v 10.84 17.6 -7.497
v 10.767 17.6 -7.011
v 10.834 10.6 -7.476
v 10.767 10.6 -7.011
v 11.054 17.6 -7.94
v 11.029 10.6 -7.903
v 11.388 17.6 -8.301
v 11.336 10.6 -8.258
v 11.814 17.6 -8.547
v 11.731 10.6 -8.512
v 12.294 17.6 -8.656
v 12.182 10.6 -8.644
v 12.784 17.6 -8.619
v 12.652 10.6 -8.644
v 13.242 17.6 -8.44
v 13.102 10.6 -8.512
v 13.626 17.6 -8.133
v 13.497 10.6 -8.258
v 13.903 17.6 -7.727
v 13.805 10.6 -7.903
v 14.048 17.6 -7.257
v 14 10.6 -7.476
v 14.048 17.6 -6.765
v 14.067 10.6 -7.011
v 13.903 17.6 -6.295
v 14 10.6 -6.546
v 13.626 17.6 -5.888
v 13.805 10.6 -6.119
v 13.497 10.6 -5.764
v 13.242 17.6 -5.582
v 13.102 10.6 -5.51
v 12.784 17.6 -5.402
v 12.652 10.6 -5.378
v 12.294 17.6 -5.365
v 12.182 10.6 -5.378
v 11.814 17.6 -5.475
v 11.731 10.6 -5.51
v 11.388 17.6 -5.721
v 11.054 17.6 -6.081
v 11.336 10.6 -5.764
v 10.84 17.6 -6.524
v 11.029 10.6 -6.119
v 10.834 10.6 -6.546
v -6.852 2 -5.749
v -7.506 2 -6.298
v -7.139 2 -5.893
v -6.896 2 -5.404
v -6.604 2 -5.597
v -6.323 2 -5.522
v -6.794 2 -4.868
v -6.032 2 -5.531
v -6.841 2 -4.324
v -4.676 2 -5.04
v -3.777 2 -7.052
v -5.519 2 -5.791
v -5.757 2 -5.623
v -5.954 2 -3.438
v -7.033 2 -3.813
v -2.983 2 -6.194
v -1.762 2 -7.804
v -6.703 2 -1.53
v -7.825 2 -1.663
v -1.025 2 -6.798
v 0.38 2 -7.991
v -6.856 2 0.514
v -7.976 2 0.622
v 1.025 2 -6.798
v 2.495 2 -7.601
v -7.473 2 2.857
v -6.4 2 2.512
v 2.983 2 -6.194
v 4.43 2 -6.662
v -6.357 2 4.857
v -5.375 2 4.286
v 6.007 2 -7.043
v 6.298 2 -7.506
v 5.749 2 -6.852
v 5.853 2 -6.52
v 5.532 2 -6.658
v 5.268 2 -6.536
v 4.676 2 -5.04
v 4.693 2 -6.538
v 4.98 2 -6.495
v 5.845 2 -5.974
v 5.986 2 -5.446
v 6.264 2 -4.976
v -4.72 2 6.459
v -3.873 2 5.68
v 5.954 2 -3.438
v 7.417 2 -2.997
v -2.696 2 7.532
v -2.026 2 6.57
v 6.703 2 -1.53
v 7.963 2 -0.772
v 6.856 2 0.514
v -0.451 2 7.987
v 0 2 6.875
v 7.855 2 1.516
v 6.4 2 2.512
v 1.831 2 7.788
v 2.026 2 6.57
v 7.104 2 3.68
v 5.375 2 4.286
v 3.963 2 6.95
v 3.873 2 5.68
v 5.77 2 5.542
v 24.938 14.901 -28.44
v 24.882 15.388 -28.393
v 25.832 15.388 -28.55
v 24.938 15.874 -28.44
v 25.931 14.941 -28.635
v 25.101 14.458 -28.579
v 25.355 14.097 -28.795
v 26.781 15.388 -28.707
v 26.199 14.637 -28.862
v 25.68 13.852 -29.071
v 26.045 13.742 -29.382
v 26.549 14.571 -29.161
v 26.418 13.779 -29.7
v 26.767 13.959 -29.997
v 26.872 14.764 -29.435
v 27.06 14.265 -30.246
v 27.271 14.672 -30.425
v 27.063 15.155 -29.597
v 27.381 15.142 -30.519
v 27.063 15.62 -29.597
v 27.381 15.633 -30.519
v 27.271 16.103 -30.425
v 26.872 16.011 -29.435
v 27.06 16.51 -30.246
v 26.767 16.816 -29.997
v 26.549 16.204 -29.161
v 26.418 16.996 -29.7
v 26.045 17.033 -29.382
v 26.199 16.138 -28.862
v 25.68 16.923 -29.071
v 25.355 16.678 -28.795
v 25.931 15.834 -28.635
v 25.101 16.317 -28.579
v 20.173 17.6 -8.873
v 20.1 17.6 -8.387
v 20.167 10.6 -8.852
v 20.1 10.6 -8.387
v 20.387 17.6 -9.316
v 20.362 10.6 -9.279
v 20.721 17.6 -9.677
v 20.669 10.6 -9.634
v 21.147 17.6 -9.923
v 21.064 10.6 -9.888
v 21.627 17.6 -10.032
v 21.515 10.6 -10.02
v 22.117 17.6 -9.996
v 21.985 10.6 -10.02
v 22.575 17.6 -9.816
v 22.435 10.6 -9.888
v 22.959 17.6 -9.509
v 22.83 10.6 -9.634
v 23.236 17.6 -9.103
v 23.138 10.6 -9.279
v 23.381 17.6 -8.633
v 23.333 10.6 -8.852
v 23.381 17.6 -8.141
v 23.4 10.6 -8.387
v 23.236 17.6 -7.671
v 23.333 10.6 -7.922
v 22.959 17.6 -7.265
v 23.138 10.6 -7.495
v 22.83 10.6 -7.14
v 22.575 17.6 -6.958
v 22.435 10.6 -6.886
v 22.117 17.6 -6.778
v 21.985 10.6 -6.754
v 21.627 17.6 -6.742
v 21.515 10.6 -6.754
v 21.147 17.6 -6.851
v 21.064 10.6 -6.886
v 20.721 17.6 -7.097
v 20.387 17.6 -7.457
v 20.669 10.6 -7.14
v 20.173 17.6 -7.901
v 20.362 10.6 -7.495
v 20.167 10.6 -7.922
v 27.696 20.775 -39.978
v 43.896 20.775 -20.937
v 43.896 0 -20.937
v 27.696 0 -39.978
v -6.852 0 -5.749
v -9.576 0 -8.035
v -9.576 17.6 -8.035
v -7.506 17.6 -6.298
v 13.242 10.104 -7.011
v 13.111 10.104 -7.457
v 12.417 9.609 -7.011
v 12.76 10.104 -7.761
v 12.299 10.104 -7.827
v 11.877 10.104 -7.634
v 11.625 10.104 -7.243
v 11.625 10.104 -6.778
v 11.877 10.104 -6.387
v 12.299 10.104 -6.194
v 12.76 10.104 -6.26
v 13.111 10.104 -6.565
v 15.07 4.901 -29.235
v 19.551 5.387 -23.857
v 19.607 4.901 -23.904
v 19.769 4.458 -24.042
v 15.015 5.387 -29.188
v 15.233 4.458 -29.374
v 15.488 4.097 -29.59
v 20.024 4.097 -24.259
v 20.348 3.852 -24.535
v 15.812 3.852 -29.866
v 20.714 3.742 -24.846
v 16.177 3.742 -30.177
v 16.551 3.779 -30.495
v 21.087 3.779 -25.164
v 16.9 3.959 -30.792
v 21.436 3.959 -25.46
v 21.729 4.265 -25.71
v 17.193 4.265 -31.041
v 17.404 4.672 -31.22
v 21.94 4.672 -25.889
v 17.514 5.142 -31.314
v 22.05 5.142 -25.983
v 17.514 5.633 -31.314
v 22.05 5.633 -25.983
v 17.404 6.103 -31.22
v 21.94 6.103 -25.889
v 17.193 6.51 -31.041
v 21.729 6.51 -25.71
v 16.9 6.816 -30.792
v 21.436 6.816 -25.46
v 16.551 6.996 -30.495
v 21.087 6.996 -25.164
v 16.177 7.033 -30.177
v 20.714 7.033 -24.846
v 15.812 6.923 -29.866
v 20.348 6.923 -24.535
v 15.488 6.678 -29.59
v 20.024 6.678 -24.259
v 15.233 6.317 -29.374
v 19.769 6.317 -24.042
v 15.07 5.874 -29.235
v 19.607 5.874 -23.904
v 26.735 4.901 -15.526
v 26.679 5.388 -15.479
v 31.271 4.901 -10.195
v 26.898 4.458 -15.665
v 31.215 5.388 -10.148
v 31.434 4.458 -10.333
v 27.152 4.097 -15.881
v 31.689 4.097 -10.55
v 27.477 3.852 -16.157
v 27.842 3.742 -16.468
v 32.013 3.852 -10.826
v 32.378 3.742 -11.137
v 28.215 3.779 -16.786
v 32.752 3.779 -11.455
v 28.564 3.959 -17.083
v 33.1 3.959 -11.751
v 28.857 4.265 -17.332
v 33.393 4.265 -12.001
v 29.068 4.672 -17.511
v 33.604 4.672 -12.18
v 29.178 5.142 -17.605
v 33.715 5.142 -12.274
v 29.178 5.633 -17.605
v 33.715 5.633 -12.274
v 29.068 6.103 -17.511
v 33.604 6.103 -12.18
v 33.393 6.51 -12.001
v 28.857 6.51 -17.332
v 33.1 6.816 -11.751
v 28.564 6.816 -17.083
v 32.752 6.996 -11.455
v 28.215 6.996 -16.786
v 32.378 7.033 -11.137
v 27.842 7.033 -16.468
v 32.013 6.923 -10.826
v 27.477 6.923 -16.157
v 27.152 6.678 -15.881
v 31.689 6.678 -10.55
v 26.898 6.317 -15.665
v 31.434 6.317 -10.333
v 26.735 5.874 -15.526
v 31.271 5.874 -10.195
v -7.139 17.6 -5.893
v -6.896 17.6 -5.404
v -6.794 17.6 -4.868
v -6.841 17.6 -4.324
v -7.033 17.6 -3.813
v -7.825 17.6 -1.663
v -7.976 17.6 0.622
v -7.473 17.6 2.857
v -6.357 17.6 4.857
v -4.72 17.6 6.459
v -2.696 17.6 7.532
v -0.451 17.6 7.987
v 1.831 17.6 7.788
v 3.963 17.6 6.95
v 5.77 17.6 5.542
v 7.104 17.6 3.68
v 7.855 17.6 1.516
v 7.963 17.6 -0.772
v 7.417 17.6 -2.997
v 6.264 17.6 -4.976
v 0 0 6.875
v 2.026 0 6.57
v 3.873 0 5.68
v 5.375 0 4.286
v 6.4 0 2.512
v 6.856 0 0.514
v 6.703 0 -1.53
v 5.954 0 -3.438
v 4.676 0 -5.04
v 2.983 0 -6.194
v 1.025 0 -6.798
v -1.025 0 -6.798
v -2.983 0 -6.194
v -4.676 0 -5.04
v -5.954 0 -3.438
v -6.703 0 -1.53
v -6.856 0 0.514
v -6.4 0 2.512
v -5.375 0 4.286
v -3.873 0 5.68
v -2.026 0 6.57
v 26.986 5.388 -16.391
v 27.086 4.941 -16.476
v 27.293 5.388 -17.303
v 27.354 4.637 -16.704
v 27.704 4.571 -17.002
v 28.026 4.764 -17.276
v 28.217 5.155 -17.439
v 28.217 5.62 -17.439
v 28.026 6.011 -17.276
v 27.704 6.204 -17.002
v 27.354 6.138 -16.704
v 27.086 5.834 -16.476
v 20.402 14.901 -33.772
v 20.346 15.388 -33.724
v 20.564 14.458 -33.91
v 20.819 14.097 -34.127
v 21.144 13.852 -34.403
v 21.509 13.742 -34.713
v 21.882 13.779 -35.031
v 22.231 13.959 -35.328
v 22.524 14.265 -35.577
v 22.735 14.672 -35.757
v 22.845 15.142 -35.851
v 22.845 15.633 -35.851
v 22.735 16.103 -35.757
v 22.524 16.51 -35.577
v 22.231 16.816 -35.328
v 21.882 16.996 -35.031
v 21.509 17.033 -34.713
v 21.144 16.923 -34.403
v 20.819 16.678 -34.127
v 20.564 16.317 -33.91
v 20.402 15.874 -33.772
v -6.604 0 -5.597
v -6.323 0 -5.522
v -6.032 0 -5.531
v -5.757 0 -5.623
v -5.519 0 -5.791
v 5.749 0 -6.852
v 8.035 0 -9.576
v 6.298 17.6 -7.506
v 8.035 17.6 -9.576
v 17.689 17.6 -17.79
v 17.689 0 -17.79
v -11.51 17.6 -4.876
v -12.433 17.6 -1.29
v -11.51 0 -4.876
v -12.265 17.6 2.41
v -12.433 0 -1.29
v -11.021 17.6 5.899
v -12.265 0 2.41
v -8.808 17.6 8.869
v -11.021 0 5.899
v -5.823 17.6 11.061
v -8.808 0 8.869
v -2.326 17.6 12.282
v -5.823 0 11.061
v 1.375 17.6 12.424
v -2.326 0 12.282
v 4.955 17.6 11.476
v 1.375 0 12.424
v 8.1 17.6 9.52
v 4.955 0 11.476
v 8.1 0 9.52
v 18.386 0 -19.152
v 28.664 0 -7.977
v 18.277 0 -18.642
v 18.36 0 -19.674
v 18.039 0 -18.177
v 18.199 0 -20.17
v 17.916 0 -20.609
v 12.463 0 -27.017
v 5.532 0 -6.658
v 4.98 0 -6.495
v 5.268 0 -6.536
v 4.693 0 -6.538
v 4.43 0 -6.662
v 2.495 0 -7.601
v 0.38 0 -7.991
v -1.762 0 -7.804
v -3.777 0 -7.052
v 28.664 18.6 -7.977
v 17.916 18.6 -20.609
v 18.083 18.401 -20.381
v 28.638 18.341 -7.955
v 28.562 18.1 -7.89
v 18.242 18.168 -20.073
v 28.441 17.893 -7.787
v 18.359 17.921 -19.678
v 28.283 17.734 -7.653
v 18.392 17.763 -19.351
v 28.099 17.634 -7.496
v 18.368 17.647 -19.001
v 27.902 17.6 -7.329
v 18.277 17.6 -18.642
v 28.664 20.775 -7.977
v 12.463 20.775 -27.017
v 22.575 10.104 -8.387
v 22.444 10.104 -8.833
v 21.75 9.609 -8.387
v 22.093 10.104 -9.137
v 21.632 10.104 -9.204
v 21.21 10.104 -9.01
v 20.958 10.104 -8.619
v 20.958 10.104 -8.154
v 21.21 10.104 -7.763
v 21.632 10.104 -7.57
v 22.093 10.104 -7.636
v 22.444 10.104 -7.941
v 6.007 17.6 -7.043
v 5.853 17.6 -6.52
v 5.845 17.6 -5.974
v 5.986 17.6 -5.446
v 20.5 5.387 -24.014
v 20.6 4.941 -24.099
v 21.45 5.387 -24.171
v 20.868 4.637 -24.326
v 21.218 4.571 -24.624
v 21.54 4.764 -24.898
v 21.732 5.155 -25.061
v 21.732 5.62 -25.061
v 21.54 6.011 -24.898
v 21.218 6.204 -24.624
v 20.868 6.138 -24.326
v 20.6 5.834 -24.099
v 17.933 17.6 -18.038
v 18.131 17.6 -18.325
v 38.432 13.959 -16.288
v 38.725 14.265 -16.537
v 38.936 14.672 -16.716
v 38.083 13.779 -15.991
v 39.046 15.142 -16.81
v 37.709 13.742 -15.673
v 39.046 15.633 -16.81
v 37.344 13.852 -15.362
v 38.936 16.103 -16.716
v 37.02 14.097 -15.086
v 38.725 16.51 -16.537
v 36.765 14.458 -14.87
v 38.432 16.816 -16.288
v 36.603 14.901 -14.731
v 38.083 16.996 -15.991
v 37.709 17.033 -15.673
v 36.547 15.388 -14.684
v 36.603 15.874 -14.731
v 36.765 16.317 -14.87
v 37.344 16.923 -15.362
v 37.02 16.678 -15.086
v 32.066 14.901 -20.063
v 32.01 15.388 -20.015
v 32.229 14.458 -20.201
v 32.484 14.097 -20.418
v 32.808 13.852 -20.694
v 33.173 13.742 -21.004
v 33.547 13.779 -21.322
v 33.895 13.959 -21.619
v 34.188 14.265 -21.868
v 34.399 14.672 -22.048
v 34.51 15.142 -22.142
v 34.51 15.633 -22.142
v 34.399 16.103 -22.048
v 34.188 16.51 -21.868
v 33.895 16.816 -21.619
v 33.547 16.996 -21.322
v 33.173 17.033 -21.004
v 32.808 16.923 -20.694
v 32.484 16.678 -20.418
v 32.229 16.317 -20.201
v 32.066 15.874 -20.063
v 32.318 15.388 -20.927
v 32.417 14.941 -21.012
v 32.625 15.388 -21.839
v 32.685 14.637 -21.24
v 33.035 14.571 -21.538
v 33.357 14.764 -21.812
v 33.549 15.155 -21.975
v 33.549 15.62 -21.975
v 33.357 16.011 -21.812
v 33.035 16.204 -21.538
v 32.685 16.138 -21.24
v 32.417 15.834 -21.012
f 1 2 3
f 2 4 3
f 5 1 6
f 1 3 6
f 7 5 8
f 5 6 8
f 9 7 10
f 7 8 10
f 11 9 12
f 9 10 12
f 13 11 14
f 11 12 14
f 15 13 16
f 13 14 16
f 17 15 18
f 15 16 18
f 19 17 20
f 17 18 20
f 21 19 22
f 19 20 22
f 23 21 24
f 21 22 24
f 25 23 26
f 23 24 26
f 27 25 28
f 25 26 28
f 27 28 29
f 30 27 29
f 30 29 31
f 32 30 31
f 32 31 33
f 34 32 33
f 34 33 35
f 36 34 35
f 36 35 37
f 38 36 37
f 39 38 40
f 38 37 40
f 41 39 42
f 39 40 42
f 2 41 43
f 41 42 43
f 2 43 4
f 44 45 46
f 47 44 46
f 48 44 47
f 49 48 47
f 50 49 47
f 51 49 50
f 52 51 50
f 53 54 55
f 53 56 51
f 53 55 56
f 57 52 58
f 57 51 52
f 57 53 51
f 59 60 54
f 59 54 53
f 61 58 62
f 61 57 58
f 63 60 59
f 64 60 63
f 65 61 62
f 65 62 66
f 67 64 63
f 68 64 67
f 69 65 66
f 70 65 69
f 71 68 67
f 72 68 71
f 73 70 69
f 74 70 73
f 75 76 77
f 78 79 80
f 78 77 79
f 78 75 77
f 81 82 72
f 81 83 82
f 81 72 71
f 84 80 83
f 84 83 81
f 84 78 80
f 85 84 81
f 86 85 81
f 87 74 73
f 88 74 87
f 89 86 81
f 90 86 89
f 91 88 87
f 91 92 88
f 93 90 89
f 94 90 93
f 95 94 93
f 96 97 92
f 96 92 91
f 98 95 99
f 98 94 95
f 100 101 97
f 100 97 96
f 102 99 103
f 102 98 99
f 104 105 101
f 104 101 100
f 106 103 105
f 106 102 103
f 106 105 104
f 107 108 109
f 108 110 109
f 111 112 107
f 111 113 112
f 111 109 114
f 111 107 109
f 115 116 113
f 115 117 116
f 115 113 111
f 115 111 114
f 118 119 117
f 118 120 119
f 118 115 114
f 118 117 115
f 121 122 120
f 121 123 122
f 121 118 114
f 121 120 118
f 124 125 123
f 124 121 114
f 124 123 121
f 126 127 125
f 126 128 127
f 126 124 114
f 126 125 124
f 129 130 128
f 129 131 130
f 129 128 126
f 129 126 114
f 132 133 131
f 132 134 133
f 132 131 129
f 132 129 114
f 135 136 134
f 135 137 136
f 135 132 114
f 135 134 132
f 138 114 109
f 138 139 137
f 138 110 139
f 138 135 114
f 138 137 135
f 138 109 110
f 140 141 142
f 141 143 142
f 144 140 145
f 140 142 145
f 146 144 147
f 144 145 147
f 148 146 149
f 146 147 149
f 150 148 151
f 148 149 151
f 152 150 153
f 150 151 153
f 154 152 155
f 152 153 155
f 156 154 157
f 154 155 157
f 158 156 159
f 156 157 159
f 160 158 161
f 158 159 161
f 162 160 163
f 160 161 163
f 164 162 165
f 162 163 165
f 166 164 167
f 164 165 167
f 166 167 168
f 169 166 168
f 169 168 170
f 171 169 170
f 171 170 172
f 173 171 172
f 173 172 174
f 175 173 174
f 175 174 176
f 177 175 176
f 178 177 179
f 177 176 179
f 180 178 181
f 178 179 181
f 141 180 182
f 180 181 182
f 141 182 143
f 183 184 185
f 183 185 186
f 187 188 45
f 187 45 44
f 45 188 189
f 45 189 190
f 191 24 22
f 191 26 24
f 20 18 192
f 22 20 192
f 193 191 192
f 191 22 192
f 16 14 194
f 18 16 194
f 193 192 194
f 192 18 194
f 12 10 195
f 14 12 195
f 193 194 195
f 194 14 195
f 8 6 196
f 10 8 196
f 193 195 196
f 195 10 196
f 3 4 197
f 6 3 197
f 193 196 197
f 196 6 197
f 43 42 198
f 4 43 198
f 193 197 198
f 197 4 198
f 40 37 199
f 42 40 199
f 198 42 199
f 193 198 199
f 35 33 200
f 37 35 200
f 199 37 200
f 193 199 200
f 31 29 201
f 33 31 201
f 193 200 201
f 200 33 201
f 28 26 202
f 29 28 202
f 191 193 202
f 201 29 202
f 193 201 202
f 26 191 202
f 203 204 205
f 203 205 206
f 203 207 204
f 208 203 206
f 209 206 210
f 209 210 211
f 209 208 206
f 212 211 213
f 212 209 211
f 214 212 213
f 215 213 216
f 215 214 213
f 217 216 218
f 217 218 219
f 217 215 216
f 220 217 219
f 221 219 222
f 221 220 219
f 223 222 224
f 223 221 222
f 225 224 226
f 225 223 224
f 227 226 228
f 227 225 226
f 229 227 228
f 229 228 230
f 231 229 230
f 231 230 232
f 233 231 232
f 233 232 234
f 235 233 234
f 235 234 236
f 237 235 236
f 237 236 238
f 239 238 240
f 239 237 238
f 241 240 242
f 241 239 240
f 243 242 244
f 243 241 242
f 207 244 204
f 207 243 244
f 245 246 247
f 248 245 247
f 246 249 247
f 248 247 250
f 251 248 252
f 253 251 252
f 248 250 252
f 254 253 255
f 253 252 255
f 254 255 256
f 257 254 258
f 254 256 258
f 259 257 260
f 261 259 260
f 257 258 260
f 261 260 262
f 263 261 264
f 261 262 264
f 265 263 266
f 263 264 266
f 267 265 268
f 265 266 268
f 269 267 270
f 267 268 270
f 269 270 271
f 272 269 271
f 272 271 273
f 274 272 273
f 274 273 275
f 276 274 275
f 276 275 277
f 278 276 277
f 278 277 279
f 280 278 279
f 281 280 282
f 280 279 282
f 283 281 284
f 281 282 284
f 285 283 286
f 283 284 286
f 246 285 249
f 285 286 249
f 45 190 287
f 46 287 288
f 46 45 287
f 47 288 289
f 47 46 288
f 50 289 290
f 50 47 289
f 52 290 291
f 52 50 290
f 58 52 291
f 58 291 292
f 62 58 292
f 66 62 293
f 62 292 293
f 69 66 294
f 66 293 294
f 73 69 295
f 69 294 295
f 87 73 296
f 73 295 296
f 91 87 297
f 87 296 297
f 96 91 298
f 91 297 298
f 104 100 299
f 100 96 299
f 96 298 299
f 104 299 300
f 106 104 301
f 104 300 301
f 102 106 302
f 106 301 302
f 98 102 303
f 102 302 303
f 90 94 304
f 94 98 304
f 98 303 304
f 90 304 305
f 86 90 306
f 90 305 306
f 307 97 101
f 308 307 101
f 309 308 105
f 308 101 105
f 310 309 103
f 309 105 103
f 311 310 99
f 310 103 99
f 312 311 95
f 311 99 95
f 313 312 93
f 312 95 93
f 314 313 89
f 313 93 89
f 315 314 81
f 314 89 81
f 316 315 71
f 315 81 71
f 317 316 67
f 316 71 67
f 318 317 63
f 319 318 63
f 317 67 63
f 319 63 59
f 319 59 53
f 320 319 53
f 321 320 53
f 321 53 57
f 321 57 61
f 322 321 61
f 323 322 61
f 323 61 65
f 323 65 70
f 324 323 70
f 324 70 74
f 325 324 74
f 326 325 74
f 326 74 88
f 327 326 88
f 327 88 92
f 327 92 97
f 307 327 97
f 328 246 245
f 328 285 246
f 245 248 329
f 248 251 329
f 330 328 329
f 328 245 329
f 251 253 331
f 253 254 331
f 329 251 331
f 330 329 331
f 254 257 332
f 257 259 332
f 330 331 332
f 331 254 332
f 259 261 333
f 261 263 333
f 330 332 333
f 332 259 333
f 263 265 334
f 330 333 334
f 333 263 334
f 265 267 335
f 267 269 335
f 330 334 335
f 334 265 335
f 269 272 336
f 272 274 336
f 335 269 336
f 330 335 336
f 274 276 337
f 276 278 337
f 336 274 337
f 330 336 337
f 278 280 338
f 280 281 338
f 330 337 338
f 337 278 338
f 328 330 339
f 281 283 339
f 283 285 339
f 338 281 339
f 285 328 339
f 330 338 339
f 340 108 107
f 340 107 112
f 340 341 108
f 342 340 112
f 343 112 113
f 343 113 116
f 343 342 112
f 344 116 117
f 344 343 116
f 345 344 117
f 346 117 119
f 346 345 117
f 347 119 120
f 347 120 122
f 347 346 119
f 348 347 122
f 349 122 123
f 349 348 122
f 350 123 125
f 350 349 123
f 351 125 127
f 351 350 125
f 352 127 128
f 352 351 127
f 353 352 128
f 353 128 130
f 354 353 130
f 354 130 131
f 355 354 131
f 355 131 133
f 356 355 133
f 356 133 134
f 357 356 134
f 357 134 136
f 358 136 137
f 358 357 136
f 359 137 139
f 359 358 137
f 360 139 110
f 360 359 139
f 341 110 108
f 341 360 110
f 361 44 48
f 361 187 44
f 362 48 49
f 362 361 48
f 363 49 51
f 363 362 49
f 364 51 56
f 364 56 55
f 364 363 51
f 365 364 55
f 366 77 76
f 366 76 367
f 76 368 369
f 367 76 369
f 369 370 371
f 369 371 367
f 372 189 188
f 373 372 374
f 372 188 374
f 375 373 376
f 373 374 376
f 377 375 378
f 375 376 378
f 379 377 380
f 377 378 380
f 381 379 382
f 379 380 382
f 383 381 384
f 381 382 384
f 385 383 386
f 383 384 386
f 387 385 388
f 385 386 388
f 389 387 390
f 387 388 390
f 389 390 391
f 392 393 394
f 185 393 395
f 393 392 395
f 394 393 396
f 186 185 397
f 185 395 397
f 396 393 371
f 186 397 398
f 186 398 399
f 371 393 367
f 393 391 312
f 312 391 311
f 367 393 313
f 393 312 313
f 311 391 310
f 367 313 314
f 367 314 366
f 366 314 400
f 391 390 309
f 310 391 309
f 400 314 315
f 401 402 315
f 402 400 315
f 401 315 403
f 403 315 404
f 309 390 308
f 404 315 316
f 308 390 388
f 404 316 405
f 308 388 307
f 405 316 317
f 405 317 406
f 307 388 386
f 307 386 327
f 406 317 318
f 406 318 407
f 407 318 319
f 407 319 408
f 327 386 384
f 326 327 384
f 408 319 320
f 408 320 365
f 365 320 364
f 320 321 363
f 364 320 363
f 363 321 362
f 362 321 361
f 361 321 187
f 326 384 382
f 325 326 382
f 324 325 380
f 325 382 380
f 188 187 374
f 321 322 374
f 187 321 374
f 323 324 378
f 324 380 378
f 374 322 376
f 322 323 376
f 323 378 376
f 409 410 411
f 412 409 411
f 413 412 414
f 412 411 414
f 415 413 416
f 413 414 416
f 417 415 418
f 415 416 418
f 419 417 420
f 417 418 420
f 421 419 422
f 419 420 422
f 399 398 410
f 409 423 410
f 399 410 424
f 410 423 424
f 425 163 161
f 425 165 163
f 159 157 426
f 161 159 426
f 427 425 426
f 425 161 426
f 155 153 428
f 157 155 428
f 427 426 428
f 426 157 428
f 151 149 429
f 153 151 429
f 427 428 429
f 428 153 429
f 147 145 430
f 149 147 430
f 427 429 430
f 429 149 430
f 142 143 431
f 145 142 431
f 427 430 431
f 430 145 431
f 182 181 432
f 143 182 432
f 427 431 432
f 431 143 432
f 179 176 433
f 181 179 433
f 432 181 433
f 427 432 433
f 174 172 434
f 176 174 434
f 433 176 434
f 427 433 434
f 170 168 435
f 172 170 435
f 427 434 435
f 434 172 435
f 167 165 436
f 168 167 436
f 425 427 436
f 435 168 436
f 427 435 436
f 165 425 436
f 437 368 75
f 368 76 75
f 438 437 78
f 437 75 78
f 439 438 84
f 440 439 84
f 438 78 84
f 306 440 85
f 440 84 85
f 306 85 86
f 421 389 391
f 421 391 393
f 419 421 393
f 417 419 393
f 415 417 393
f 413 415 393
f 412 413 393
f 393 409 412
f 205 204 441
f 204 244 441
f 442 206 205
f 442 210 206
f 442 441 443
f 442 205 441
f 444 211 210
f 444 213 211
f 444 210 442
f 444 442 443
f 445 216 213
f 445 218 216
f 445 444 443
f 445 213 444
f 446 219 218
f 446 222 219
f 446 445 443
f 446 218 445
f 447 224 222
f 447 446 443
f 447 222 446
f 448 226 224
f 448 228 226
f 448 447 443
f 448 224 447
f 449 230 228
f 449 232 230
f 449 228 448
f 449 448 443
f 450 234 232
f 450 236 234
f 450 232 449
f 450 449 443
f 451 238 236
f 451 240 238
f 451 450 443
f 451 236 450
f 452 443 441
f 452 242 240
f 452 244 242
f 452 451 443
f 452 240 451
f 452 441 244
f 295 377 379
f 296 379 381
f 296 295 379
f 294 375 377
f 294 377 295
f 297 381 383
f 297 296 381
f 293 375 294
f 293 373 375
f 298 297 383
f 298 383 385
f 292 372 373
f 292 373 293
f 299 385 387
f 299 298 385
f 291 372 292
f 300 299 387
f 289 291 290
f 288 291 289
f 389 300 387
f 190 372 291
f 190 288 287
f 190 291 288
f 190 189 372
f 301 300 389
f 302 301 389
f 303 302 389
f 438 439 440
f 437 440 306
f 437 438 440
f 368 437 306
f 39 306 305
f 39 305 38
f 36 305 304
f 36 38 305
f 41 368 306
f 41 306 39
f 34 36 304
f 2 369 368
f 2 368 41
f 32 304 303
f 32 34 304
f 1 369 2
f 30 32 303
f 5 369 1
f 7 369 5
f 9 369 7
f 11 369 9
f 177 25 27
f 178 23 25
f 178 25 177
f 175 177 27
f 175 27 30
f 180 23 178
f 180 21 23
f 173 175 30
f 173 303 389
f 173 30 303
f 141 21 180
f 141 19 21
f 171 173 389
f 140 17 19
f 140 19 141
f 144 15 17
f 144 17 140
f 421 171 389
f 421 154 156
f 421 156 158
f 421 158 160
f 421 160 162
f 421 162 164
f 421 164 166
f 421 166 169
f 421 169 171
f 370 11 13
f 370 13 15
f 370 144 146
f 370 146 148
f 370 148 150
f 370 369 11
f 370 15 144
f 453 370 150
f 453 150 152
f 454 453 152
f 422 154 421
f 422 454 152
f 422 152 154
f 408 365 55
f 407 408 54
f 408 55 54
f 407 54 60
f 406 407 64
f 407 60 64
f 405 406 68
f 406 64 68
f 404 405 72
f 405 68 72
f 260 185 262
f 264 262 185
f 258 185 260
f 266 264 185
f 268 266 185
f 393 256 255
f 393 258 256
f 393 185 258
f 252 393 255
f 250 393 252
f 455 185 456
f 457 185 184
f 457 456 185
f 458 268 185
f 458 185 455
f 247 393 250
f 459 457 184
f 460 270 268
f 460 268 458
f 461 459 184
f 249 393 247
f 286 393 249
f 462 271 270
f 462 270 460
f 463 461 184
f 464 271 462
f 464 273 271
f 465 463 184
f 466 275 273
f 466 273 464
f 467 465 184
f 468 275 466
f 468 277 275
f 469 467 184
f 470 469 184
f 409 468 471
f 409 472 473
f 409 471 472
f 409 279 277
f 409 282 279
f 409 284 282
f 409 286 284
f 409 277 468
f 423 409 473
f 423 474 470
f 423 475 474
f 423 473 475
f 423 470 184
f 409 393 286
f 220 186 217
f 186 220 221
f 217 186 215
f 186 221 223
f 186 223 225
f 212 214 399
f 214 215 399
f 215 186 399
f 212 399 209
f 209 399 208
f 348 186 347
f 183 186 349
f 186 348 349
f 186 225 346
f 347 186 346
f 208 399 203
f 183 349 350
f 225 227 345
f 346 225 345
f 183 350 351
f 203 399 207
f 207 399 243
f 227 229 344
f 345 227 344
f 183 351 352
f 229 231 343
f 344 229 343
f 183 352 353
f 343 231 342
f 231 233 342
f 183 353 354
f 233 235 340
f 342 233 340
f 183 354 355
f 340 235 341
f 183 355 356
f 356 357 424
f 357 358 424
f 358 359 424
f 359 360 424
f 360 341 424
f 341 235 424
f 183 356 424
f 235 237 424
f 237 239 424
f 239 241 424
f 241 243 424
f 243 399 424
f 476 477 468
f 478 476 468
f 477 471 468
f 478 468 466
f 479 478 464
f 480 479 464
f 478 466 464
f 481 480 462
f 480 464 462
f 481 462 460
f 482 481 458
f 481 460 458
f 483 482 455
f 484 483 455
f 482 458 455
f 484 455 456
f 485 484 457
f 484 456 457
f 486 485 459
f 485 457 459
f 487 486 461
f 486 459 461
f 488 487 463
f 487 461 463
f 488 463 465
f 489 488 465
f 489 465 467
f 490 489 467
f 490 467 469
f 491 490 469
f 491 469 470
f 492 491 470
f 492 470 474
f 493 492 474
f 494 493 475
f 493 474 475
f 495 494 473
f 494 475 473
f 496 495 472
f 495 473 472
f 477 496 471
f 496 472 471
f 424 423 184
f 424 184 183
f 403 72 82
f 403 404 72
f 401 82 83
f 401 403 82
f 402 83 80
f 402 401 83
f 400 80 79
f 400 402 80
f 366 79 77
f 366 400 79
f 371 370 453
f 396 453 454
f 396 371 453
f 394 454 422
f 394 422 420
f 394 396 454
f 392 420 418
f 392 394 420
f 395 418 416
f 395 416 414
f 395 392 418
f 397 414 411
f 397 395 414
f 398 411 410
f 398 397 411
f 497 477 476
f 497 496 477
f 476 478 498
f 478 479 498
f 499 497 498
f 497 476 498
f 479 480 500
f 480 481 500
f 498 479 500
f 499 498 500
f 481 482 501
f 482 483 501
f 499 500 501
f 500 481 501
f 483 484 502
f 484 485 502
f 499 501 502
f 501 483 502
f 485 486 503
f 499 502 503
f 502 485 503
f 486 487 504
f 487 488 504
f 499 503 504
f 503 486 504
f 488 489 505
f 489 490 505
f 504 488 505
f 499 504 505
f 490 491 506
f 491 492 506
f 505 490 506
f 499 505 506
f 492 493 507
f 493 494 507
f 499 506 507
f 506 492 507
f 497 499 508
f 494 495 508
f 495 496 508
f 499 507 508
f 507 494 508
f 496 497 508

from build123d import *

# Parameters (mm, degrees)
SKETCH1_R                      = 12.5
BOSS_EXTRUDE1_DEPTH            = 17.6
SKETCH2_R                      = 6.875
CUT_EXTRUDE1_DEPTH             = 50.8
SKETCH3_R                      = 8
CUT_EXTRUDE3_DEPTH             = 15.6
CUT_EXTRUDE4_DEPTH             = 25.945139807
BOSS_EXTRUDE2_DEPTH            = 17.6
FILLET1_R                      = 2
SKETCH6_W                      = 25
SKETCH6_H                      = 20.775
BOSS_EXTRUDE3_DEPTH            = 20
M4X0_7_TAPPED_HOLE2_AT_2_COUNT = 2
M4X0_7_TAPPED_HOLE2_AT_2_PITCH = 12.206555616
M4X0_7_TAPPED_HOLE1_D          = 3.3
M4X0_7_TAPPED_HOLE1_DEPTH      = 7
M4X0_7_TAPPED_HOLE1_TIP        = 0.991420021
FILLET4_R                      = 1
FILLET6_R                      = 1
FILLET7_R                      = 2


with BuildPart() as part:
    # Sketch1 → Boss-Extrude1 (new body)
    with BuildSketch(Plane(origin=(0, 0, 0), x_dir=(1, 0, 0), z_dir=(0, 1, 0))):
        with Locations(Location((0, 0, 0), (0, 0, 270))):
            Circle(SKETCH1_R)
    extrude(amount=BOSS_EXTRUDE1_DEPTH)

    # Sketch2 → Cut-Extrude1 (cut)
    with BuildSketch(Plane(origin=(0, 17.6, 0), x_dir=(1, 0, 0), z_dir=(0, 1, 0))):
        with Locations(Location((0, 0, 0), (0, 0, 270))):
            Circle(SKETCH2_R)
    extrude(amount=-CUT_EXTRUDE1_DEPTH, mode=Mode.SUBTRACT)

    # Sketch3 → Cut-Extrude3 (cut)
    with BuildSketch(Plane(origin=(0, 17.6, 0), x_dir=(1, 0, 0), z_dir=(0, 1, 0))):
        with Locations(Location((0, 0, 0), (0, 0, 270))):
            Circle(SKETCH3_R)
    extrude(amount=-CUT_EXTRUDE3_DEPTH, mode=Mode.SUBTRACT)

    # Sketch4 → Cut-Extrude4 (cut, through all)
    with BuildSketch(Plane(origin=(0, 17.6, 0), x_dir=(1, 0, 0), z_dir=(0, 1, 0))):
        with BuildLine():
            ThreePointArc((-6.128355545, 5.142300877), (-0.697245942, 7.969557585), (5.142300877, 6.128355545))
            Line((5.142300877, 6.128355545), (8.034845121, 9.575555539))
            ThreePointArc((8.034845121, 9.575555539), (-1.089446784, 12.452433726), (-9.575555539, 8.034845121))
            Line((-9.575555539, 8.034845121), (-6.128355545, 5.142300877))
        make_face()
    extrude(amount=-CUT_EXTRUDE4_DEPTH, mode=Mode.SUBTRACT)

    # Sketch5 → Boss-Extrude2 (add, through all)
    with BuildSketch(Plane(origin=(0, 17.6, 0), x_dir=(1, 0, 0), z_dir=(0, 1, 0))):
        with BuildLine():
            Line((28.663977541, 7.976615292), (19.211771381, 19.085584129))
            Line((19.211771381, 19.085584129), (8.034845121, 9.575555539))
            ThreePointArc((8.034845121, 9.575555539), (12.499926406, 0.042893271), (8.100371818, -9.520187835))
            Line((8.100371818, -9.520187835), (28.663977541, 7.976615292))
        make_face()
    extrude(amount=-BOSS_EXTRUDE2_DEPTH)

    # Fillet1
    fillet1_edges = [part.edges().sort_by_distance(p)[0] for p in [
        (5.142300877, 9.8, -6.128355545),
        (-6.128355545, 9.8, -5.142300877),
    ]]
    fillet(fillet1_edges, radius=FILLET1_R)

    # Sketch6 → Boss-Extrude3 (add)
    with BuildSketch(Plane(origin=(20.563605723, 0, -17.496803127), x_dir=(-0.6480297454391464, 0, -0.7616150267858922), z_dir=(0.7616150267858922, 0, -0.6480297454391464))):
        with Locations((0, 10.3875)):
            Rectangle(SKETCH6_W, SKETCH6_H)
    extrude(amount=BOSS_EXTRUDE3_DEPTH)

    # Sketch9 → M4x0.7 Tapped Hole2 (revolve, cut)
    with BuildSketch(Plane(origin=(21.602614227, 15.3875, -34.793347907), x_dir=(-0.7616150267858922, 0, 0.6480297454391463), z_dir=(0, 1, 0))):
        Polygon((0, 0), (0, 7.991420021), (1.65, 7), (1.65, 0), align=None)
    m4x0_7_tapped_hole2 = revolve(axis=Axis((17.487625343, 15.3875, -39.629603327), (0.6480297454391463, 0, 0.7616150267858921)), mode=Mode.SUBTRACT)

    # M4x0.7 Tapped Hole2 at 2: M4x0.7 Tapped Hole2 ×2
    with Locations(*[Vector(-0.43675753876297707, -0.8192319205190405, 0.3716206570367036) * (i * M4X0_7_TAPPED_HOLE2_AT_2_PITCH) for i in range(1, M4X0_7_TAPPED_HOLE2_AT_2_COUNT)]):
        add(m4x0_7_tapped_hole2, mode=Mode.SUBTRACT)

    # Mirror1: M4x0.7 Tapped Hole2 across plane
    add(m4x0_7_tapped_hole2.mirror(Plane(origin=(0, 0, 0), x_dir=(-0.7616150267858919, 0, 0.6480297454391465), z_dir=(-0.6480297454391465, 0, -0.761615026785892))), mode=Mode.SUBTRACT)

    # Mirror1 copy 1 sketch → Mirror1 copy 1 (revolve, cut)
    with BuildSketch(Plane(origin=(32.472052675, 5.3875, -11.216764019), x_dir=(-0.7616150267858918, 0, 0.6480297454391468), z_dir=(0, 1, 0))):
        Polygon((0, 0), (0, -7.991420021), (1.65, -7), (1.65, 0), align=None)
    revolve(axis=Axis((36.587041559, 5.3875, -6.380508599), (0.6480297454391466, 0, 0.7616150267858917)), mode=Mode.SUBTRACT)

    # M4x0.7 Tapped Hole1
    with Locations(Plane(origin=(0, 17.6, 0), x_dir=(1, 0, 0), z_dir=(0, 1, 0))):
        with Locations((21.749873691, 8.386913416), (12.41680475, 7.010750587)):
            Hole(M4X0_7_TAPPED_HOLE1_D / 2, depth=M4X0_7_TAPPED_HOLE1_DEPTH)
            with Locations((0, 0, -(M4X0_7_TAPPED_HOLE1_DEPTH + M4X0_7_TAPPED_HOLE1_TIP / 2))):  # 118° drill point
                Cone(0, M4X0_7_TAPPED_HOLE1_D / 2, M4X0_7_TAPPED_HOLE1_TIP, mode=Mode.SUBTRACT)

    # Fillet4
    fillet4_edges = [part.edges().sort_by_distance(p)[0] for p in [
        (23.937874461, 17.6, -13.531099711),
    ]]
    fillet(fillet4_edges, radius=FILLET4_R)

    # Fillet6
    fillet6_edges = [part.edges().sort_by_distance(p)[0] for p in [
        (-6.128355545, 1, -5.142300877),
        (5.142300877, 1, -6.128355545),
    ]]
    fillet(fillet6_edges, radius=FILLET6_R)

    # Fillet7
    fillet7_edges = [part.edges().sort_by_distance(p)[0] for p in [
        (19.211771381, 9.3, -19.085584129),
    ]]
    fillet(fillet7_edges, radius=FILLET7_R)


solid = part.part
